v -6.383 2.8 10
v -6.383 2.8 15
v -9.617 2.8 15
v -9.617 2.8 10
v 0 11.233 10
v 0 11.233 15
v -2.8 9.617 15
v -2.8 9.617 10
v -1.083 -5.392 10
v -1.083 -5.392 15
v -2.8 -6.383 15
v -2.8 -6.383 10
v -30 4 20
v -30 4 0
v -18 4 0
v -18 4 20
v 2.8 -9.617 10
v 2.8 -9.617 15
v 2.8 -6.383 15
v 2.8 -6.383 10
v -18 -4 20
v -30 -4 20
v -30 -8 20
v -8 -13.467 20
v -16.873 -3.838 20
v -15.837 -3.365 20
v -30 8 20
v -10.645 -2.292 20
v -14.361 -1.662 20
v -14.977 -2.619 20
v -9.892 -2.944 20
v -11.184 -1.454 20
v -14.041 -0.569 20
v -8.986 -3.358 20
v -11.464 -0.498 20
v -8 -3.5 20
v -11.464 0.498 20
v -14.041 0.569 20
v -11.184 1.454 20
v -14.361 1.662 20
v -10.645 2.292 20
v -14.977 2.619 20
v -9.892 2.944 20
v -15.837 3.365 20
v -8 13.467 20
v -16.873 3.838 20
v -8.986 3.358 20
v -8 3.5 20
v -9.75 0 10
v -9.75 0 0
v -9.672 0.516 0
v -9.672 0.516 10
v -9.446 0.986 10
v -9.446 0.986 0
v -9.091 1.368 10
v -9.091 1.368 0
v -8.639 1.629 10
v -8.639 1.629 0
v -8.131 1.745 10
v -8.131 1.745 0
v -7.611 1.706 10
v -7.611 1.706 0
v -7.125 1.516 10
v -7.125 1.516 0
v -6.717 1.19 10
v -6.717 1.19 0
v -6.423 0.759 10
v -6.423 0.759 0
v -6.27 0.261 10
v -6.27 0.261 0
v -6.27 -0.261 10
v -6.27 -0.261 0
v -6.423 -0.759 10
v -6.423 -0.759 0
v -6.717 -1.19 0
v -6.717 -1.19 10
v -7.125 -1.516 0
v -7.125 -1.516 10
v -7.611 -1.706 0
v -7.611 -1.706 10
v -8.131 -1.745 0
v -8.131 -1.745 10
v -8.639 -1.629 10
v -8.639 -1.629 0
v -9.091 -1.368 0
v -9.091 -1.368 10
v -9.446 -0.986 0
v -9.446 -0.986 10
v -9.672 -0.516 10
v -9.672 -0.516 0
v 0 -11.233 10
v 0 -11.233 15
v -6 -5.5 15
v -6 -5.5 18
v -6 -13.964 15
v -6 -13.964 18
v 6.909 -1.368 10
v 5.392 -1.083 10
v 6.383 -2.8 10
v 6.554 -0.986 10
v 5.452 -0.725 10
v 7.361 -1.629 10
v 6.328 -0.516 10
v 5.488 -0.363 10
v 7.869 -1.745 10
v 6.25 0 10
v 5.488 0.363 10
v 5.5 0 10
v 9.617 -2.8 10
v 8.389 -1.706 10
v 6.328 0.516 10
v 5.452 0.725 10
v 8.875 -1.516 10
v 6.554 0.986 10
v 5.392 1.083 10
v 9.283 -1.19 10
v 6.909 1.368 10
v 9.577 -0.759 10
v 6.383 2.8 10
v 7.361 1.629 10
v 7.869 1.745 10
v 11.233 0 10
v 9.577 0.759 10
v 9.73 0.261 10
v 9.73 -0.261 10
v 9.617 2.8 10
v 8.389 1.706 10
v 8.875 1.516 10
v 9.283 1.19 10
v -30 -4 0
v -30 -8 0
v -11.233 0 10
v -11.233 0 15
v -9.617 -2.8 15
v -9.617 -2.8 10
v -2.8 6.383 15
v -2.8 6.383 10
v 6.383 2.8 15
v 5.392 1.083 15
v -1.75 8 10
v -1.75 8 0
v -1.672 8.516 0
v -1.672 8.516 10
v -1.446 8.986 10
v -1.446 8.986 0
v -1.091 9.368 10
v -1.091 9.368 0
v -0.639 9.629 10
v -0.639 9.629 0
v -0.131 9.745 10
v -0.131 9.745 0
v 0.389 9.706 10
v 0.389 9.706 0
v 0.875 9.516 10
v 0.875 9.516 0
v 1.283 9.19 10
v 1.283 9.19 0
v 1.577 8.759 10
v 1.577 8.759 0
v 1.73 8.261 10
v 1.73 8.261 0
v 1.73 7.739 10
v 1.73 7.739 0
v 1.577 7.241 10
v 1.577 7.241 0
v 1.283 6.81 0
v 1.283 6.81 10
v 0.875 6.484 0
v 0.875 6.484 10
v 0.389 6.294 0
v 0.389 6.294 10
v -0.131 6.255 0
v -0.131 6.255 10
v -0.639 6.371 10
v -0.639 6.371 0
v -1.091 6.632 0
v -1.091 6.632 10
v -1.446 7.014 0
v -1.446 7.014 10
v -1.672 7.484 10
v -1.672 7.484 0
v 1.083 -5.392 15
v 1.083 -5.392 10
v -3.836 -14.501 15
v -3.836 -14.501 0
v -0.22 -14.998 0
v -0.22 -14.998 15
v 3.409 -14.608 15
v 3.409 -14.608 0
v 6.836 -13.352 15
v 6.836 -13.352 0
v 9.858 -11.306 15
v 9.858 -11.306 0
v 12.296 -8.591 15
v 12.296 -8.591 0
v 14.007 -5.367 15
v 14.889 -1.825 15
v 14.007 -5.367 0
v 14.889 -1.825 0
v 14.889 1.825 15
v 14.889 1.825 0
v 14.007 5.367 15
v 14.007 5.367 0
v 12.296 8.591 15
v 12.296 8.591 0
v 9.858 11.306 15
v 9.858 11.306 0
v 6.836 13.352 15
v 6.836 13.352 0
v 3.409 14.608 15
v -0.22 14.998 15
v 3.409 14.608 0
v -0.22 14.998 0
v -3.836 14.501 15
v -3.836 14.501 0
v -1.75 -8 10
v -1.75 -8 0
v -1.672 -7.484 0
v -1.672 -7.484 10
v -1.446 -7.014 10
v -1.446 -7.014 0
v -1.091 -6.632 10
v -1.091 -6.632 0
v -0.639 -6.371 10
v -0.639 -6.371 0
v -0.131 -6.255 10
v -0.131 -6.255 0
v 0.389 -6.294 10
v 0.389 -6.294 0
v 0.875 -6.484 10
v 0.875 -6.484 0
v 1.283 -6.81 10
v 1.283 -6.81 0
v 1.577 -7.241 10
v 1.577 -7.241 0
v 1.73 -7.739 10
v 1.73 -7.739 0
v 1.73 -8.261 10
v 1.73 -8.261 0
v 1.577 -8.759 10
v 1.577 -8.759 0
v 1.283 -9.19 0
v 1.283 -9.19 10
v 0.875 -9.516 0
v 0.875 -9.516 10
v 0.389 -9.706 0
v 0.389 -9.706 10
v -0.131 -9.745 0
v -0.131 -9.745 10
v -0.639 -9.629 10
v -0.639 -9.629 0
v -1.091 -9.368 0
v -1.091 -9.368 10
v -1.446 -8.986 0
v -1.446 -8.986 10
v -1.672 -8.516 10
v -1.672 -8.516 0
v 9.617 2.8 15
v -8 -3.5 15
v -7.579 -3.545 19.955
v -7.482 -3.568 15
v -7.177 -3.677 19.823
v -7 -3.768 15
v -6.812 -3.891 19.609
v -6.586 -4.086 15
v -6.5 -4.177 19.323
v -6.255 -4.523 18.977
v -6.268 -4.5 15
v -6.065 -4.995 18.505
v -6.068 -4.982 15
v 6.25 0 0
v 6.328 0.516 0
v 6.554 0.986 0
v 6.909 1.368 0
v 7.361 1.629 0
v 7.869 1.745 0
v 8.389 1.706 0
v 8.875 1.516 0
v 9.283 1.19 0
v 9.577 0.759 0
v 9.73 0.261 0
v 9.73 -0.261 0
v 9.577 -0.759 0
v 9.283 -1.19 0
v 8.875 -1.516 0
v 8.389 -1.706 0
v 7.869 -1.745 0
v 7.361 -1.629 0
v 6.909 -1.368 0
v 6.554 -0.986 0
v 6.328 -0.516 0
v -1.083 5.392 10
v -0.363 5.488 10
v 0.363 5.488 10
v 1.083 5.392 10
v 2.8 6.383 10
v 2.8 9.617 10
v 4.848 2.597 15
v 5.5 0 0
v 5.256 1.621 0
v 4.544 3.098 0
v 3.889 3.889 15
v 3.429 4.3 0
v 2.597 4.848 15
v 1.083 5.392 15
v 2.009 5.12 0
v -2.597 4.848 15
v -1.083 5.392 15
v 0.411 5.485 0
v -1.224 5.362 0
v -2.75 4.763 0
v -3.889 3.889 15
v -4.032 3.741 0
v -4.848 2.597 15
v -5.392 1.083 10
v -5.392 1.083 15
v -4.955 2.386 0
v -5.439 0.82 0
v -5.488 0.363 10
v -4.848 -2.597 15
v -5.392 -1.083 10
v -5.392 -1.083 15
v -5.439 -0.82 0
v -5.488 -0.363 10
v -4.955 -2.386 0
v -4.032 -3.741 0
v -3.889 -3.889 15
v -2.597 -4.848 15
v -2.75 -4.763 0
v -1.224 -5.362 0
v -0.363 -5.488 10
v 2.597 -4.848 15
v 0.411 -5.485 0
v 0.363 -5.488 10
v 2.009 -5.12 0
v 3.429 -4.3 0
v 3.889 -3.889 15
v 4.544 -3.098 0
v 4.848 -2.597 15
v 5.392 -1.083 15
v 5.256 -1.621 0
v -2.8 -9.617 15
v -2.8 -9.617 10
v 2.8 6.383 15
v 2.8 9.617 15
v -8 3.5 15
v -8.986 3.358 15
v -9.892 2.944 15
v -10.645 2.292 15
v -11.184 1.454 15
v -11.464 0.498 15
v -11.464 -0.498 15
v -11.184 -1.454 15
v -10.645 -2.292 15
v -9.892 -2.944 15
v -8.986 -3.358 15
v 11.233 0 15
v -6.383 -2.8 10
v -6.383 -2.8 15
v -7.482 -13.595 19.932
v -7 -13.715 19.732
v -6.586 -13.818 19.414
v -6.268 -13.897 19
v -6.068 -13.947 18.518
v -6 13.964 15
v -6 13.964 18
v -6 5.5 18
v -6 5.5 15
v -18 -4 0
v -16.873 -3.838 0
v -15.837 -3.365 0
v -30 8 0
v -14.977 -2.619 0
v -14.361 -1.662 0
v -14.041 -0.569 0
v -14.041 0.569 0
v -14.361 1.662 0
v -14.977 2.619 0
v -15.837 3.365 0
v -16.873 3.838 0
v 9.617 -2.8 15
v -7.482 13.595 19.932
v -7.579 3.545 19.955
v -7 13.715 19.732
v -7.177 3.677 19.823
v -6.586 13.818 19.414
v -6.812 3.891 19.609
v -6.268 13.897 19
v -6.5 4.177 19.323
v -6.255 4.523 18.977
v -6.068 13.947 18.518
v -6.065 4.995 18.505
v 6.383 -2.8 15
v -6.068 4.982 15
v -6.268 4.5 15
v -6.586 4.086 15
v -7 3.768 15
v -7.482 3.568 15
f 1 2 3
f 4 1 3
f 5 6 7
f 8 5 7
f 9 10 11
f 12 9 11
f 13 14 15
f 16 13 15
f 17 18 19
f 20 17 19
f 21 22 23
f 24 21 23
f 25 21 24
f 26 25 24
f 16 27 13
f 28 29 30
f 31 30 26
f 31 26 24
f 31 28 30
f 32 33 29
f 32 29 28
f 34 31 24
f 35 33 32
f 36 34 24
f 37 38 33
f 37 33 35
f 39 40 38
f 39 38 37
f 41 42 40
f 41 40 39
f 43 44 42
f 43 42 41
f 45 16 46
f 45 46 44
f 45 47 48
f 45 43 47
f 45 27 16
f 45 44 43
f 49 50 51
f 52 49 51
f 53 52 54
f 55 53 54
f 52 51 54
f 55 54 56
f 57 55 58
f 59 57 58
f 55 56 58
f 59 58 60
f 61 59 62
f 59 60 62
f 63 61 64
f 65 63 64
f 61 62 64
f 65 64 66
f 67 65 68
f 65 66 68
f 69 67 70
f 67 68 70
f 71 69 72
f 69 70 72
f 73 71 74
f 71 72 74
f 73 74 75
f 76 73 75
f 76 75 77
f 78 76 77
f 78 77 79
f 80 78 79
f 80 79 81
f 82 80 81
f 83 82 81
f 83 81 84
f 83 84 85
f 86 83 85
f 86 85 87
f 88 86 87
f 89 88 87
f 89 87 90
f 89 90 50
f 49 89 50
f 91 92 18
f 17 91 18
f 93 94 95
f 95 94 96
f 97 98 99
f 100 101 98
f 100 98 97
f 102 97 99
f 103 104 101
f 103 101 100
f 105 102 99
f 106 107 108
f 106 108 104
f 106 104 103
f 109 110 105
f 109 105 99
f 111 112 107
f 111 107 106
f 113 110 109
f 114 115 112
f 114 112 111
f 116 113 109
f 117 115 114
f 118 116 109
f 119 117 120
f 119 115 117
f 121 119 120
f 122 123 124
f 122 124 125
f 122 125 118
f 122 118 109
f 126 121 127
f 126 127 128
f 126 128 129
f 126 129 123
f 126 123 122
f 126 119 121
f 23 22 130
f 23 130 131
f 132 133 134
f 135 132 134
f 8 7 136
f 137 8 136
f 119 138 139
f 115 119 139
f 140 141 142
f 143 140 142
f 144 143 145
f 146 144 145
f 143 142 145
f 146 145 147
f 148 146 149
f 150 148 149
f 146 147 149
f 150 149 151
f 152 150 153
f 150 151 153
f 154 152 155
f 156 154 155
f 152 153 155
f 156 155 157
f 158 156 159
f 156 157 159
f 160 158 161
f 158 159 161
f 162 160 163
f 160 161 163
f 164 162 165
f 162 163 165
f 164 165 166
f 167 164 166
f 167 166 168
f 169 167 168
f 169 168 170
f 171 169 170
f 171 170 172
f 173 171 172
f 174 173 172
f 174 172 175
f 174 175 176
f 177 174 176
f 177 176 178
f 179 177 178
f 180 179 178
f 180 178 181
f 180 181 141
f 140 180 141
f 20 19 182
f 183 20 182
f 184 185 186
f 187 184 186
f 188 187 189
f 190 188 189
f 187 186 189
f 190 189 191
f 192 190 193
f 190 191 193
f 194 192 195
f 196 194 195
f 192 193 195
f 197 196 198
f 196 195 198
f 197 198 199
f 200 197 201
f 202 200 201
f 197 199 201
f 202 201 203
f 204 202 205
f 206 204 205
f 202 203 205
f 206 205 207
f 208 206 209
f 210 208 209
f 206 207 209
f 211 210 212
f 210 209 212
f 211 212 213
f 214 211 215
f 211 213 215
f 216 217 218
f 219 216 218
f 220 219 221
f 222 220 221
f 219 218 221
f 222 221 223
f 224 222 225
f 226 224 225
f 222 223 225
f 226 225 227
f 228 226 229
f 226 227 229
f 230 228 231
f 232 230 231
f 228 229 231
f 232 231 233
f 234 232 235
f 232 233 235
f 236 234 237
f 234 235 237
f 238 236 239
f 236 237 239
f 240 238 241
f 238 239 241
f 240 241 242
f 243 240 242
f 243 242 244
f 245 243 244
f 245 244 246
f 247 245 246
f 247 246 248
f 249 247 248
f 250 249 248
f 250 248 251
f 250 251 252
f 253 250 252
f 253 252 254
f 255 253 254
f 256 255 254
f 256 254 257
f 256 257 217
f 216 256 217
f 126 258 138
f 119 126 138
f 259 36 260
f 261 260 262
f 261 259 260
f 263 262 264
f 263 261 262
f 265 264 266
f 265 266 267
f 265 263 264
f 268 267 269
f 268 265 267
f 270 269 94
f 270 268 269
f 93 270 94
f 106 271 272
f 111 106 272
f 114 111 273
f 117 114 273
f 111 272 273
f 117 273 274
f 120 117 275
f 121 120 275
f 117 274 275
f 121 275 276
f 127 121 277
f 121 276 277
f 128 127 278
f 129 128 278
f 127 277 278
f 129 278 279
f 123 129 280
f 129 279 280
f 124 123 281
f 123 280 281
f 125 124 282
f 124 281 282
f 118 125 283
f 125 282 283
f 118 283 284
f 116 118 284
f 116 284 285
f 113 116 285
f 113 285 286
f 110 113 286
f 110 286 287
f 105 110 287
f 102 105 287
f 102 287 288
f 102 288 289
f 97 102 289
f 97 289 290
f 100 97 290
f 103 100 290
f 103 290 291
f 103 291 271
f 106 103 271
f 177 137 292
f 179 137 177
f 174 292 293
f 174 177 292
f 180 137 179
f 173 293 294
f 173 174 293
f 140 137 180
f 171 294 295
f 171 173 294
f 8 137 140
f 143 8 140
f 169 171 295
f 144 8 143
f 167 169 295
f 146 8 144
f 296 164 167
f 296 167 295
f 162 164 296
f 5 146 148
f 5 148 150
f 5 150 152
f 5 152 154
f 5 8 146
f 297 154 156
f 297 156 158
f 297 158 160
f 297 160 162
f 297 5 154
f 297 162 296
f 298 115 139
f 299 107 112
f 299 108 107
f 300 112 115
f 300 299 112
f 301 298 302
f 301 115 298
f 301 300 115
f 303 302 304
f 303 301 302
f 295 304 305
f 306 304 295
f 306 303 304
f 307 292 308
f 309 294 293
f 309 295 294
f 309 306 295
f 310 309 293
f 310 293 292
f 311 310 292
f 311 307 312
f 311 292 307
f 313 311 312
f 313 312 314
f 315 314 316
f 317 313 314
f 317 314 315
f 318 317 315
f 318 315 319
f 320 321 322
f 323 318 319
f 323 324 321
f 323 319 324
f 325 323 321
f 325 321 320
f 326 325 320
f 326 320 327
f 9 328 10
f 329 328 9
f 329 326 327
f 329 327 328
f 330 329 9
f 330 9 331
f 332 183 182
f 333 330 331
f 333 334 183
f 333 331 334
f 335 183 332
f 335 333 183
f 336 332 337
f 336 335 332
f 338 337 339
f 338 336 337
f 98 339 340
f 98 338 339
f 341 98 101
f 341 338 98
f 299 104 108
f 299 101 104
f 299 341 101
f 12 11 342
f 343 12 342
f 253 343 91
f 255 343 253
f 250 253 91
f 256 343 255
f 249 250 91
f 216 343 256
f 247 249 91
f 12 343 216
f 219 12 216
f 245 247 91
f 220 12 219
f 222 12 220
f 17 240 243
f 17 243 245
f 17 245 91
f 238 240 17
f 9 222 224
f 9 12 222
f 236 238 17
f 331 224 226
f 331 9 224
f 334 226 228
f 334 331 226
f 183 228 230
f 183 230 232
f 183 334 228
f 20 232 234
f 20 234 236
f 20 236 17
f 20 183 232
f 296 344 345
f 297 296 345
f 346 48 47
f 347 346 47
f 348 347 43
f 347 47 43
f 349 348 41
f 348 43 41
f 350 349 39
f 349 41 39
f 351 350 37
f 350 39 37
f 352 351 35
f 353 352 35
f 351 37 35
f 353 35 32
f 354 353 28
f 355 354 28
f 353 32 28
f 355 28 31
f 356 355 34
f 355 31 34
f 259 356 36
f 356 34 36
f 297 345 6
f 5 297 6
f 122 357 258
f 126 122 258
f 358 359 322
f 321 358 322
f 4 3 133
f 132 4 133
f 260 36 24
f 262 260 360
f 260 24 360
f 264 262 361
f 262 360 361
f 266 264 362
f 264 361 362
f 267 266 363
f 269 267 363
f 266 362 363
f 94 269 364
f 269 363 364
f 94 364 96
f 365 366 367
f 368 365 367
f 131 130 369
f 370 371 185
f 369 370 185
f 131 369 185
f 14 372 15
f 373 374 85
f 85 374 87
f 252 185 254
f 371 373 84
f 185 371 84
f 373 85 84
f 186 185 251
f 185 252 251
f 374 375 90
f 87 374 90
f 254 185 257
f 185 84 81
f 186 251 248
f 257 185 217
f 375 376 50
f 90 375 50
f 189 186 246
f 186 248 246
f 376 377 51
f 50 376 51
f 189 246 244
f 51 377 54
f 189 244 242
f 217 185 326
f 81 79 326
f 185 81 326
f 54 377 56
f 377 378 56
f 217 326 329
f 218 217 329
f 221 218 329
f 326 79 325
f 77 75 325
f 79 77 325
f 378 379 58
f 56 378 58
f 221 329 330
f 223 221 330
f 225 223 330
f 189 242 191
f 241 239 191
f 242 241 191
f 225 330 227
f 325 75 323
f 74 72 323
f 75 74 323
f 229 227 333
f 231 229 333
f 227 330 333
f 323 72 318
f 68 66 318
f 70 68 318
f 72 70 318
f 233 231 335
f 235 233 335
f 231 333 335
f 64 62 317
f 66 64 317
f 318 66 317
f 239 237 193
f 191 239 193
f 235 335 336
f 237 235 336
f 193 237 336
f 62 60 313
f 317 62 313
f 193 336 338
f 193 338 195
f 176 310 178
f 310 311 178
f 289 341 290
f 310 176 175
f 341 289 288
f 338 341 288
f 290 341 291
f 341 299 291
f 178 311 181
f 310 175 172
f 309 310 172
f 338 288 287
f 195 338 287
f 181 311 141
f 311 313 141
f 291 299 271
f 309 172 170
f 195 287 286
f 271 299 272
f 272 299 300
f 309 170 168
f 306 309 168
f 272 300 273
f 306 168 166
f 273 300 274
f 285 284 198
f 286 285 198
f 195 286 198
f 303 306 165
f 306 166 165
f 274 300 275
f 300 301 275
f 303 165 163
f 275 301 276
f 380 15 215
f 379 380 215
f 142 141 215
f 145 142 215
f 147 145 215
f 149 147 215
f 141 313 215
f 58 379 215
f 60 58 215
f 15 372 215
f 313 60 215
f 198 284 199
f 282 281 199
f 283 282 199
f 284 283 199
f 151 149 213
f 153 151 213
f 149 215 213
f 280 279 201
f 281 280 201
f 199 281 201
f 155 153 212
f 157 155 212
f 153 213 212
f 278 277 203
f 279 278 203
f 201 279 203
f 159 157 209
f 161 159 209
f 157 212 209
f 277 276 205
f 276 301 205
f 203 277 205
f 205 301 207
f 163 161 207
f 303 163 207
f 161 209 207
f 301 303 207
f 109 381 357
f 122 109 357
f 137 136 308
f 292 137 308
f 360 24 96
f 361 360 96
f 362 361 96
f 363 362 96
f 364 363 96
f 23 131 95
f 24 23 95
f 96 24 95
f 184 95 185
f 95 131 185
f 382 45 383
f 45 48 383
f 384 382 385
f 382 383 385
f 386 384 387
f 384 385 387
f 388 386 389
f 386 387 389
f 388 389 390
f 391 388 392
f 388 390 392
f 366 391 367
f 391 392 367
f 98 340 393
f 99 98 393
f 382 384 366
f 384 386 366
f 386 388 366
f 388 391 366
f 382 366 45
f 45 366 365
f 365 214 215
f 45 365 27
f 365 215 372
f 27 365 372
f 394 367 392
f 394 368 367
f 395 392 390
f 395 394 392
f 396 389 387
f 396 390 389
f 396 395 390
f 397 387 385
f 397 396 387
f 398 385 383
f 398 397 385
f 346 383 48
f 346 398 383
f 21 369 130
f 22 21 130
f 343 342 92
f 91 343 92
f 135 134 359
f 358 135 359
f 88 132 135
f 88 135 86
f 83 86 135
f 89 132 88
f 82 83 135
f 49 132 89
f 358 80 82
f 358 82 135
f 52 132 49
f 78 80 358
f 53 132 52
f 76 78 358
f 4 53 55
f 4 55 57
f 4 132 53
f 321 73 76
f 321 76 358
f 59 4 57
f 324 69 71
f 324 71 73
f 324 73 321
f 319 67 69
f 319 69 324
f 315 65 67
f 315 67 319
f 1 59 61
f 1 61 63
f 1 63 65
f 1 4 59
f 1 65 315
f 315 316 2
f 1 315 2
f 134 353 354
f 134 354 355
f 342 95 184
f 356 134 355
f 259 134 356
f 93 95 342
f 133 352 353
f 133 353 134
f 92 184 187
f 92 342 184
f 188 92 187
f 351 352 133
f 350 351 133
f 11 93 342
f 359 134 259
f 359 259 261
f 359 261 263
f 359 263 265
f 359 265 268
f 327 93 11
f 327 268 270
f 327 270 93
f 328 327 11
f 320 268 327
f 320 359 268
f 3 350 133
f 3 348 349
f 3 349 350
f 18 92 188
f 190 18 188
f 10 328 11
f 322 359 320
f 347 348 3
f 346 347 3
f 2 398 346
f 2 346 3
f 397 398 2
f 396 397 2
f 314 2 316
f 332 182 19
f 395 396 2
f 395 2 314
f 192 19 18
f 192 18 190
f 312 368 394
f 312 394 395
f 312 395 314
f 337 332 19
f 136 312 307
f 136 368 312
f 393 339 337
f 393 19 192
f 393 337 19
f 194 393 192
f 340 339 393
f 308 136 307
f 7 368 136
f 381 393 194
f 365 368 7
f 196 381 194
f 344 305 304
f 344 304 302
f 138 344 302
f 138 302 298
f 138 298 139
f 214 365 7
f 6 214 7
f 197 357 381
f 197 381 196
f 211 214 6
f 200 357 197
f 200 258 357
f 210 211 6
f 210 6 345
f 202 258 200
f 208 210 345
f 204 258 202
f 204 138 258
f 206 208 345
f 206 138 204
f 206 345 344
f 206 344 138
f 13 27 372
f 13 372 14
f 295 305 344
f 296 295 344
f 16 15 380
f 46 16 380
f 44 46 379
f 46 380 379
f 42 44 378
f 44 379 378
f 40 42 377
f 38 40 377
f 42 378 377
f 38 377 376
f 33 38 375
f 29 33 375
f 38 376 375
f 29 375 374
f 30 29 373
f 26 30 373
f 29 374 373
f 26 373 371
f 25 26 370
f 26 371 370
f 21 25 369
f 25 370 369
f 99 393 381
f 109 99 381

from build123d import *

# Parameters (mm, degrees)
F0_R     = 5.5
F1_DEPTH = 20
F3_D     = 3.5
F5_DEPTH = 10
F7_DEPTH = 5
F8_R     = 1.99999


# Not quite as in the source:
# - a fillet or chamfer is up to 0.001 mm smaller than in the source, because OpenCascade refuses the exact size


with BuildPart() as f1:
    # F0 (on Top) → F1 (new body)
    with BuildSketch(Plane.XY):
        with BuildLine():
            ThreePointArc((-18, 4), (-14, 0), (-18, -4))
            Line((-18, -4), (-30, -4))
            Line((-30, -4), (-30, -8))
            Line((-30, -8), (-3.8358095935, -14.5012607991))
            ThreePointArc((-3.8358095935, -14.5012607991), (15, 0), (-3.8358095935, 14.5012607991))
            Line((-3.8358095935, 14.5012607991), (-30, 8))
            Line((-30, 8), (-30, 4))
            Line((-30, 4), (-18, 4))
        make_face()
        Circle(F0_R, mode=Mode.SUBTRACT)
    extrude(amount=F1_DEPTH)

    # F3 (through all)
    with Locations(Plane.XY.offset(20)):
        with Locations((8, 0), (0, -8), (-8, 0), (0, 8)):
            Hole(F3_D / 2)

    # F4 (on face) → F5 (cut)
    with BuildSketch(Plane.XY.offset(20)):
        Polygon((11.2331615075, 0), (9.6165807537, 2.8), (6.3834192463, 2.8), (4.7668384925, 0), (6.3834192463, -2.8), (9.6165807537, -2.8), align=None)
        Polygon((-2.8, 9.6165807537), (-2.8, 6.3834192463), (0, 4.7668384925), (2.8, 6.3834192463), (2.8, 9.6165807537), (0, 11.2331615075), align=None)
        Polygon((-9.6165807537, -2.8), (-6.3834192463, -2.8), (-4.7668384925, 0), (-6.3834192463, 2.8), (-9.6165807537, 2.8), (-11.2331615075, 0), align=None)
        Polygon((2.8, -9.6165807537), (2.8, -6.3834192463), (0, -4.7668384925), (-2.8, -6.3834192463), (-2.8, -9.6165807537), (0, -11.2331615075), align=None)
    extrude(amount=-F5_DEPTH, mode=Mode.SUBTRACT)

    # F6 (on face) → F7 (cut)
    with BuildSketch(Plane.XY.offset(20)):
        with BuildLine():
            Line((-6, -13.9635041923), (-3.8358095935, -14.5012607991))
            ThreePointArc((-3.8358095935, -14.5012607991), (15, 0), (-3.8358095935, 14.5012607991))
            Line((-3.8358095935, 14.5012607991), (-6, 13.9635041923))
            Line((-6, 13.9635041923), (-6, 3.5))
            Line((-6, 3.5), (-8, 3.5))
            ThreePointArc((-8, 3.5), (-11.5, 0), (-8, -3.5))
            Line((-8, -3.5), (-6, -3.5))
            Line((-6, -3.5), (-6, -13.9635041923))
        make_face()
    extrude(amount=-F7_DEPTH, mode=Mode.SUBTRACT)

    # F8 (radius 2 in the source; OpenCascade refuses exactly that, so slightly less here)
    f8_edges = [f1.edges().sort_by_distance(p)[0] for p in [
        (-6, -8.731752, 20),
        (-6, 8.731752, 20),
        (-6, -3.5, 17.5),
        (-6, 3.5, 17.5),
    ]]
    fillet(f8_edges, radius=F8_R)


solid = f1.part
